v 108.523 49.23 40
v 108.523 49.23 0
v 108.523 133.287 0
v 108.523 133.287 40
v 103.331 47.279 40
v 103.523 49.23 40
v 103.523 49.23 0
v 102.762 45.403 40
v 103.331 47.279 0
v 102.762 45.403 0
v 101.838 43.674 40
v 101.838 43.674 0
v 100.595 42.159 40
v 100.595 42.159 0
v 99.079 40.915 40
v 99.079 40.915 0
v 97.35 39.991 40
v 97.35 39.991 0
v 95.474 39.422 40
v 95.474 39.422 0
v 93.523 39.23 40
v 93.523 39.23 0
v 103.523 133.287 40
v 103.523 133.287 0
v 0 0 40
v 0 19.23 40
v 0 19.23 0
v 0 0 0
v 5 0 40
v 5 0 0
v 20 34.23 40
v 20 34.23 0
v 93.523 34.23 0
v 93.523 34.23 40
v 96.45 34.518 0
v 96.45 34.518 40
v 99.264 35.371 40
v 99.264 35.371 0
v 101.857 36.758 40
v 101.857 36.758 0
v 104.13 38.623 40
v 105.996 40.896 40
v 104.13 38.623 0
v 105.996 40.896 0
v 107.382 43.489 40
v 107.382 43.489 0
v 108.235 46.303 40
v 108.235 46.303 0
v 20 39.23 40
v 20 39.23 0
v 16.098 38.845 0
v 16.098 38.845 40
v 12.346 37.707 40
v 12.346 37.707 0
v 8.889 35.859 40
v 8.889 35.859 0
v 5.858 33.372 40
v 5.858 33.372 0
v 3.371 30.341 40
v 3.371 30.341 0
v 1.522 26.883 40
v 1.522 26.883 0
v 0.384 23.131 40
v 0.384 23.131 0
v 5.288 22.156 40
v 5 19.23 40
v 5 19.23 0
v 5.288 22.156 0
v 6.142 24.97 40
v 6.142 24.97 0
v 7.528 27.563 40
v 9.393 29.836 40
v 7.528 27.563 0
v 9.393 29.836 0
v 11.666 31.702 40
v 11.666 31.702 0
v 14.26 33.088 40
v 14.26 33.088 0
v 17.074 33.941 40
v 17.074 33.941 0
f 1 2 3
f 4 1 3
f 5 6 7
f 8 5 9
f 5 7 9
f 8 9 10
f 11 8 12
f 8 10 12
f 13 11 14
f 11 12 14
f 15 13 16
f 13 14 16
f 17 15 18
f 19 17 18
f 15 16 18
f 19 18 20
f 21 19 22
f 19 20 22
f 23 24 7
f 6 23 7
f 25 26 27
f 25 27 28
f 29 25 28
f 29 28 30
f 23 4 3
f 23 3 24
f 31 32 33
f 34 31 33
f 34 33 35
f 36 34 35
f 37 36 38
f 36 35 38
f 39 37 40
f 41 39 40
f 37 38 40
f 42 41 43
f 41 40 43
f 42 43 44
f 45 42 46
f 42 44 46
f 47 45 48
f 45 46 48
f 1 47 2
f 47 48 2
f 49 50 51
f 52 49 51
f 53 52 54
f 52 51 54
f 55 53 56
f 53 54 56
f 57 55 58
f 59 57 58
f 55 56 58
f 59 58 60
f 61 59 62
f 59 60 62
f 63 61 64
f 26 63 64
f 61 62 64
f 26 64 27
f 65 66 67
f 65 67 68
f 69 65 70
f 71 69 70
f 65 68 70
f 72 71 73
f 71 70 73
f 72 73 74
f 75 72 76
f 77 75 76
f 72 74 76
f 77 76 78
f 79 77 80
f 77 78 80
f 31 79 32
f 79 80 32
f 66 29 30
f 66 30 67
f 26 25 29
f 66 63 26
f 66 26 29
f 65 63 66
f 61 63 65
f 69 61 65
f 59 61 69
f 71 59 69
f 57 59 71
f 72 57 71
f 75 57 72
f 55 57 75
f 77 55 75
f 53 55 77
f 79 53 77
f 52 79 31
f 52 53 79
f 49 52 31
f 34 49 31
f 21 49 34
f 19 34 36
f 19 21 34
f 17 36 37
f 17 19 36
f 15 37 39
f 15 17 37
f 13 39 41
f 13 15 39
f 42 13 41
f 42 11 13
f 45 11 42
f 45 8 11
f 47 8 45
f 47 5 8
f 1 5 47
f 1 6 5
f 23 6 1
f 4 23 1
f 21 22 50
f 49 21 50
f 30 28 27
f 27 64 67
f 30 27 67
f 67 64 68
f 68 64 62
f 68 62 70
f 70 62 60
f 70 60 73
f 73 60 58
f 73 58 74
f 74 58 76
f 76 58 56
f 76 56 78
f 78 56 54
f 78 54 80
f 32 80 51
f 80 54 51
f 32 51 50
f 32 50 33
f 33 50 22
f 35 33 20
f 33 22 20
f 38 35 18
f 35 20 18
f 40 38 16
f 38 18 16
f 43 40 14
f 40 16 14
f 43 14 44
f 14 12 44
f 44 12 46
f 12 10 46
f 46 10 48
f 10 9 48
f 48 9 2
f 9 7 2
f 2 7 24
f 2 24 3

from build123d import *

# Parameters (mm, degrees)
F1_DEPTH = 40


with BuildPart() as f1:
    # F0 (on Top) → F1 (new body)
    with BuildSketch(Plane.XY):
        with BuildLine():
            Line((0, 19.229688), (0, 0))
            Line((0, 0), (5, 0))
            Line((5, 0), (5, 19.229688))
            ThreePointArc((5, 19.229688), (9.393398, 29.836289), (20, 34.229688))
            Line((20, 34.229688), (93.523487, 34.229688))
            ThreePointArc((93.523487, 34.229688), (104.130089, 38.623086), (108.523487, 49.229688))
            Line((108.523487, 49.229688), (108.523487, 133.286635))
            Line((108.523487, 133.286635), (103.523487, 133.286635))
            Line((103.523487, 133.286635), (103.523487, 49.229688))
            ThreePointArc((103.523487, 49.229688), (100.594555, 42.15862), (93.523487, 39.229688))
            Line((93.523487, 39.229688), (20, 39.229688))
            ThreePointArc((20, 39.229688), (5.857864, 33.371823), (0, 19.229688))
        make_face()
    extrude(amount=F1_DEPTH)


solid = f1.part
